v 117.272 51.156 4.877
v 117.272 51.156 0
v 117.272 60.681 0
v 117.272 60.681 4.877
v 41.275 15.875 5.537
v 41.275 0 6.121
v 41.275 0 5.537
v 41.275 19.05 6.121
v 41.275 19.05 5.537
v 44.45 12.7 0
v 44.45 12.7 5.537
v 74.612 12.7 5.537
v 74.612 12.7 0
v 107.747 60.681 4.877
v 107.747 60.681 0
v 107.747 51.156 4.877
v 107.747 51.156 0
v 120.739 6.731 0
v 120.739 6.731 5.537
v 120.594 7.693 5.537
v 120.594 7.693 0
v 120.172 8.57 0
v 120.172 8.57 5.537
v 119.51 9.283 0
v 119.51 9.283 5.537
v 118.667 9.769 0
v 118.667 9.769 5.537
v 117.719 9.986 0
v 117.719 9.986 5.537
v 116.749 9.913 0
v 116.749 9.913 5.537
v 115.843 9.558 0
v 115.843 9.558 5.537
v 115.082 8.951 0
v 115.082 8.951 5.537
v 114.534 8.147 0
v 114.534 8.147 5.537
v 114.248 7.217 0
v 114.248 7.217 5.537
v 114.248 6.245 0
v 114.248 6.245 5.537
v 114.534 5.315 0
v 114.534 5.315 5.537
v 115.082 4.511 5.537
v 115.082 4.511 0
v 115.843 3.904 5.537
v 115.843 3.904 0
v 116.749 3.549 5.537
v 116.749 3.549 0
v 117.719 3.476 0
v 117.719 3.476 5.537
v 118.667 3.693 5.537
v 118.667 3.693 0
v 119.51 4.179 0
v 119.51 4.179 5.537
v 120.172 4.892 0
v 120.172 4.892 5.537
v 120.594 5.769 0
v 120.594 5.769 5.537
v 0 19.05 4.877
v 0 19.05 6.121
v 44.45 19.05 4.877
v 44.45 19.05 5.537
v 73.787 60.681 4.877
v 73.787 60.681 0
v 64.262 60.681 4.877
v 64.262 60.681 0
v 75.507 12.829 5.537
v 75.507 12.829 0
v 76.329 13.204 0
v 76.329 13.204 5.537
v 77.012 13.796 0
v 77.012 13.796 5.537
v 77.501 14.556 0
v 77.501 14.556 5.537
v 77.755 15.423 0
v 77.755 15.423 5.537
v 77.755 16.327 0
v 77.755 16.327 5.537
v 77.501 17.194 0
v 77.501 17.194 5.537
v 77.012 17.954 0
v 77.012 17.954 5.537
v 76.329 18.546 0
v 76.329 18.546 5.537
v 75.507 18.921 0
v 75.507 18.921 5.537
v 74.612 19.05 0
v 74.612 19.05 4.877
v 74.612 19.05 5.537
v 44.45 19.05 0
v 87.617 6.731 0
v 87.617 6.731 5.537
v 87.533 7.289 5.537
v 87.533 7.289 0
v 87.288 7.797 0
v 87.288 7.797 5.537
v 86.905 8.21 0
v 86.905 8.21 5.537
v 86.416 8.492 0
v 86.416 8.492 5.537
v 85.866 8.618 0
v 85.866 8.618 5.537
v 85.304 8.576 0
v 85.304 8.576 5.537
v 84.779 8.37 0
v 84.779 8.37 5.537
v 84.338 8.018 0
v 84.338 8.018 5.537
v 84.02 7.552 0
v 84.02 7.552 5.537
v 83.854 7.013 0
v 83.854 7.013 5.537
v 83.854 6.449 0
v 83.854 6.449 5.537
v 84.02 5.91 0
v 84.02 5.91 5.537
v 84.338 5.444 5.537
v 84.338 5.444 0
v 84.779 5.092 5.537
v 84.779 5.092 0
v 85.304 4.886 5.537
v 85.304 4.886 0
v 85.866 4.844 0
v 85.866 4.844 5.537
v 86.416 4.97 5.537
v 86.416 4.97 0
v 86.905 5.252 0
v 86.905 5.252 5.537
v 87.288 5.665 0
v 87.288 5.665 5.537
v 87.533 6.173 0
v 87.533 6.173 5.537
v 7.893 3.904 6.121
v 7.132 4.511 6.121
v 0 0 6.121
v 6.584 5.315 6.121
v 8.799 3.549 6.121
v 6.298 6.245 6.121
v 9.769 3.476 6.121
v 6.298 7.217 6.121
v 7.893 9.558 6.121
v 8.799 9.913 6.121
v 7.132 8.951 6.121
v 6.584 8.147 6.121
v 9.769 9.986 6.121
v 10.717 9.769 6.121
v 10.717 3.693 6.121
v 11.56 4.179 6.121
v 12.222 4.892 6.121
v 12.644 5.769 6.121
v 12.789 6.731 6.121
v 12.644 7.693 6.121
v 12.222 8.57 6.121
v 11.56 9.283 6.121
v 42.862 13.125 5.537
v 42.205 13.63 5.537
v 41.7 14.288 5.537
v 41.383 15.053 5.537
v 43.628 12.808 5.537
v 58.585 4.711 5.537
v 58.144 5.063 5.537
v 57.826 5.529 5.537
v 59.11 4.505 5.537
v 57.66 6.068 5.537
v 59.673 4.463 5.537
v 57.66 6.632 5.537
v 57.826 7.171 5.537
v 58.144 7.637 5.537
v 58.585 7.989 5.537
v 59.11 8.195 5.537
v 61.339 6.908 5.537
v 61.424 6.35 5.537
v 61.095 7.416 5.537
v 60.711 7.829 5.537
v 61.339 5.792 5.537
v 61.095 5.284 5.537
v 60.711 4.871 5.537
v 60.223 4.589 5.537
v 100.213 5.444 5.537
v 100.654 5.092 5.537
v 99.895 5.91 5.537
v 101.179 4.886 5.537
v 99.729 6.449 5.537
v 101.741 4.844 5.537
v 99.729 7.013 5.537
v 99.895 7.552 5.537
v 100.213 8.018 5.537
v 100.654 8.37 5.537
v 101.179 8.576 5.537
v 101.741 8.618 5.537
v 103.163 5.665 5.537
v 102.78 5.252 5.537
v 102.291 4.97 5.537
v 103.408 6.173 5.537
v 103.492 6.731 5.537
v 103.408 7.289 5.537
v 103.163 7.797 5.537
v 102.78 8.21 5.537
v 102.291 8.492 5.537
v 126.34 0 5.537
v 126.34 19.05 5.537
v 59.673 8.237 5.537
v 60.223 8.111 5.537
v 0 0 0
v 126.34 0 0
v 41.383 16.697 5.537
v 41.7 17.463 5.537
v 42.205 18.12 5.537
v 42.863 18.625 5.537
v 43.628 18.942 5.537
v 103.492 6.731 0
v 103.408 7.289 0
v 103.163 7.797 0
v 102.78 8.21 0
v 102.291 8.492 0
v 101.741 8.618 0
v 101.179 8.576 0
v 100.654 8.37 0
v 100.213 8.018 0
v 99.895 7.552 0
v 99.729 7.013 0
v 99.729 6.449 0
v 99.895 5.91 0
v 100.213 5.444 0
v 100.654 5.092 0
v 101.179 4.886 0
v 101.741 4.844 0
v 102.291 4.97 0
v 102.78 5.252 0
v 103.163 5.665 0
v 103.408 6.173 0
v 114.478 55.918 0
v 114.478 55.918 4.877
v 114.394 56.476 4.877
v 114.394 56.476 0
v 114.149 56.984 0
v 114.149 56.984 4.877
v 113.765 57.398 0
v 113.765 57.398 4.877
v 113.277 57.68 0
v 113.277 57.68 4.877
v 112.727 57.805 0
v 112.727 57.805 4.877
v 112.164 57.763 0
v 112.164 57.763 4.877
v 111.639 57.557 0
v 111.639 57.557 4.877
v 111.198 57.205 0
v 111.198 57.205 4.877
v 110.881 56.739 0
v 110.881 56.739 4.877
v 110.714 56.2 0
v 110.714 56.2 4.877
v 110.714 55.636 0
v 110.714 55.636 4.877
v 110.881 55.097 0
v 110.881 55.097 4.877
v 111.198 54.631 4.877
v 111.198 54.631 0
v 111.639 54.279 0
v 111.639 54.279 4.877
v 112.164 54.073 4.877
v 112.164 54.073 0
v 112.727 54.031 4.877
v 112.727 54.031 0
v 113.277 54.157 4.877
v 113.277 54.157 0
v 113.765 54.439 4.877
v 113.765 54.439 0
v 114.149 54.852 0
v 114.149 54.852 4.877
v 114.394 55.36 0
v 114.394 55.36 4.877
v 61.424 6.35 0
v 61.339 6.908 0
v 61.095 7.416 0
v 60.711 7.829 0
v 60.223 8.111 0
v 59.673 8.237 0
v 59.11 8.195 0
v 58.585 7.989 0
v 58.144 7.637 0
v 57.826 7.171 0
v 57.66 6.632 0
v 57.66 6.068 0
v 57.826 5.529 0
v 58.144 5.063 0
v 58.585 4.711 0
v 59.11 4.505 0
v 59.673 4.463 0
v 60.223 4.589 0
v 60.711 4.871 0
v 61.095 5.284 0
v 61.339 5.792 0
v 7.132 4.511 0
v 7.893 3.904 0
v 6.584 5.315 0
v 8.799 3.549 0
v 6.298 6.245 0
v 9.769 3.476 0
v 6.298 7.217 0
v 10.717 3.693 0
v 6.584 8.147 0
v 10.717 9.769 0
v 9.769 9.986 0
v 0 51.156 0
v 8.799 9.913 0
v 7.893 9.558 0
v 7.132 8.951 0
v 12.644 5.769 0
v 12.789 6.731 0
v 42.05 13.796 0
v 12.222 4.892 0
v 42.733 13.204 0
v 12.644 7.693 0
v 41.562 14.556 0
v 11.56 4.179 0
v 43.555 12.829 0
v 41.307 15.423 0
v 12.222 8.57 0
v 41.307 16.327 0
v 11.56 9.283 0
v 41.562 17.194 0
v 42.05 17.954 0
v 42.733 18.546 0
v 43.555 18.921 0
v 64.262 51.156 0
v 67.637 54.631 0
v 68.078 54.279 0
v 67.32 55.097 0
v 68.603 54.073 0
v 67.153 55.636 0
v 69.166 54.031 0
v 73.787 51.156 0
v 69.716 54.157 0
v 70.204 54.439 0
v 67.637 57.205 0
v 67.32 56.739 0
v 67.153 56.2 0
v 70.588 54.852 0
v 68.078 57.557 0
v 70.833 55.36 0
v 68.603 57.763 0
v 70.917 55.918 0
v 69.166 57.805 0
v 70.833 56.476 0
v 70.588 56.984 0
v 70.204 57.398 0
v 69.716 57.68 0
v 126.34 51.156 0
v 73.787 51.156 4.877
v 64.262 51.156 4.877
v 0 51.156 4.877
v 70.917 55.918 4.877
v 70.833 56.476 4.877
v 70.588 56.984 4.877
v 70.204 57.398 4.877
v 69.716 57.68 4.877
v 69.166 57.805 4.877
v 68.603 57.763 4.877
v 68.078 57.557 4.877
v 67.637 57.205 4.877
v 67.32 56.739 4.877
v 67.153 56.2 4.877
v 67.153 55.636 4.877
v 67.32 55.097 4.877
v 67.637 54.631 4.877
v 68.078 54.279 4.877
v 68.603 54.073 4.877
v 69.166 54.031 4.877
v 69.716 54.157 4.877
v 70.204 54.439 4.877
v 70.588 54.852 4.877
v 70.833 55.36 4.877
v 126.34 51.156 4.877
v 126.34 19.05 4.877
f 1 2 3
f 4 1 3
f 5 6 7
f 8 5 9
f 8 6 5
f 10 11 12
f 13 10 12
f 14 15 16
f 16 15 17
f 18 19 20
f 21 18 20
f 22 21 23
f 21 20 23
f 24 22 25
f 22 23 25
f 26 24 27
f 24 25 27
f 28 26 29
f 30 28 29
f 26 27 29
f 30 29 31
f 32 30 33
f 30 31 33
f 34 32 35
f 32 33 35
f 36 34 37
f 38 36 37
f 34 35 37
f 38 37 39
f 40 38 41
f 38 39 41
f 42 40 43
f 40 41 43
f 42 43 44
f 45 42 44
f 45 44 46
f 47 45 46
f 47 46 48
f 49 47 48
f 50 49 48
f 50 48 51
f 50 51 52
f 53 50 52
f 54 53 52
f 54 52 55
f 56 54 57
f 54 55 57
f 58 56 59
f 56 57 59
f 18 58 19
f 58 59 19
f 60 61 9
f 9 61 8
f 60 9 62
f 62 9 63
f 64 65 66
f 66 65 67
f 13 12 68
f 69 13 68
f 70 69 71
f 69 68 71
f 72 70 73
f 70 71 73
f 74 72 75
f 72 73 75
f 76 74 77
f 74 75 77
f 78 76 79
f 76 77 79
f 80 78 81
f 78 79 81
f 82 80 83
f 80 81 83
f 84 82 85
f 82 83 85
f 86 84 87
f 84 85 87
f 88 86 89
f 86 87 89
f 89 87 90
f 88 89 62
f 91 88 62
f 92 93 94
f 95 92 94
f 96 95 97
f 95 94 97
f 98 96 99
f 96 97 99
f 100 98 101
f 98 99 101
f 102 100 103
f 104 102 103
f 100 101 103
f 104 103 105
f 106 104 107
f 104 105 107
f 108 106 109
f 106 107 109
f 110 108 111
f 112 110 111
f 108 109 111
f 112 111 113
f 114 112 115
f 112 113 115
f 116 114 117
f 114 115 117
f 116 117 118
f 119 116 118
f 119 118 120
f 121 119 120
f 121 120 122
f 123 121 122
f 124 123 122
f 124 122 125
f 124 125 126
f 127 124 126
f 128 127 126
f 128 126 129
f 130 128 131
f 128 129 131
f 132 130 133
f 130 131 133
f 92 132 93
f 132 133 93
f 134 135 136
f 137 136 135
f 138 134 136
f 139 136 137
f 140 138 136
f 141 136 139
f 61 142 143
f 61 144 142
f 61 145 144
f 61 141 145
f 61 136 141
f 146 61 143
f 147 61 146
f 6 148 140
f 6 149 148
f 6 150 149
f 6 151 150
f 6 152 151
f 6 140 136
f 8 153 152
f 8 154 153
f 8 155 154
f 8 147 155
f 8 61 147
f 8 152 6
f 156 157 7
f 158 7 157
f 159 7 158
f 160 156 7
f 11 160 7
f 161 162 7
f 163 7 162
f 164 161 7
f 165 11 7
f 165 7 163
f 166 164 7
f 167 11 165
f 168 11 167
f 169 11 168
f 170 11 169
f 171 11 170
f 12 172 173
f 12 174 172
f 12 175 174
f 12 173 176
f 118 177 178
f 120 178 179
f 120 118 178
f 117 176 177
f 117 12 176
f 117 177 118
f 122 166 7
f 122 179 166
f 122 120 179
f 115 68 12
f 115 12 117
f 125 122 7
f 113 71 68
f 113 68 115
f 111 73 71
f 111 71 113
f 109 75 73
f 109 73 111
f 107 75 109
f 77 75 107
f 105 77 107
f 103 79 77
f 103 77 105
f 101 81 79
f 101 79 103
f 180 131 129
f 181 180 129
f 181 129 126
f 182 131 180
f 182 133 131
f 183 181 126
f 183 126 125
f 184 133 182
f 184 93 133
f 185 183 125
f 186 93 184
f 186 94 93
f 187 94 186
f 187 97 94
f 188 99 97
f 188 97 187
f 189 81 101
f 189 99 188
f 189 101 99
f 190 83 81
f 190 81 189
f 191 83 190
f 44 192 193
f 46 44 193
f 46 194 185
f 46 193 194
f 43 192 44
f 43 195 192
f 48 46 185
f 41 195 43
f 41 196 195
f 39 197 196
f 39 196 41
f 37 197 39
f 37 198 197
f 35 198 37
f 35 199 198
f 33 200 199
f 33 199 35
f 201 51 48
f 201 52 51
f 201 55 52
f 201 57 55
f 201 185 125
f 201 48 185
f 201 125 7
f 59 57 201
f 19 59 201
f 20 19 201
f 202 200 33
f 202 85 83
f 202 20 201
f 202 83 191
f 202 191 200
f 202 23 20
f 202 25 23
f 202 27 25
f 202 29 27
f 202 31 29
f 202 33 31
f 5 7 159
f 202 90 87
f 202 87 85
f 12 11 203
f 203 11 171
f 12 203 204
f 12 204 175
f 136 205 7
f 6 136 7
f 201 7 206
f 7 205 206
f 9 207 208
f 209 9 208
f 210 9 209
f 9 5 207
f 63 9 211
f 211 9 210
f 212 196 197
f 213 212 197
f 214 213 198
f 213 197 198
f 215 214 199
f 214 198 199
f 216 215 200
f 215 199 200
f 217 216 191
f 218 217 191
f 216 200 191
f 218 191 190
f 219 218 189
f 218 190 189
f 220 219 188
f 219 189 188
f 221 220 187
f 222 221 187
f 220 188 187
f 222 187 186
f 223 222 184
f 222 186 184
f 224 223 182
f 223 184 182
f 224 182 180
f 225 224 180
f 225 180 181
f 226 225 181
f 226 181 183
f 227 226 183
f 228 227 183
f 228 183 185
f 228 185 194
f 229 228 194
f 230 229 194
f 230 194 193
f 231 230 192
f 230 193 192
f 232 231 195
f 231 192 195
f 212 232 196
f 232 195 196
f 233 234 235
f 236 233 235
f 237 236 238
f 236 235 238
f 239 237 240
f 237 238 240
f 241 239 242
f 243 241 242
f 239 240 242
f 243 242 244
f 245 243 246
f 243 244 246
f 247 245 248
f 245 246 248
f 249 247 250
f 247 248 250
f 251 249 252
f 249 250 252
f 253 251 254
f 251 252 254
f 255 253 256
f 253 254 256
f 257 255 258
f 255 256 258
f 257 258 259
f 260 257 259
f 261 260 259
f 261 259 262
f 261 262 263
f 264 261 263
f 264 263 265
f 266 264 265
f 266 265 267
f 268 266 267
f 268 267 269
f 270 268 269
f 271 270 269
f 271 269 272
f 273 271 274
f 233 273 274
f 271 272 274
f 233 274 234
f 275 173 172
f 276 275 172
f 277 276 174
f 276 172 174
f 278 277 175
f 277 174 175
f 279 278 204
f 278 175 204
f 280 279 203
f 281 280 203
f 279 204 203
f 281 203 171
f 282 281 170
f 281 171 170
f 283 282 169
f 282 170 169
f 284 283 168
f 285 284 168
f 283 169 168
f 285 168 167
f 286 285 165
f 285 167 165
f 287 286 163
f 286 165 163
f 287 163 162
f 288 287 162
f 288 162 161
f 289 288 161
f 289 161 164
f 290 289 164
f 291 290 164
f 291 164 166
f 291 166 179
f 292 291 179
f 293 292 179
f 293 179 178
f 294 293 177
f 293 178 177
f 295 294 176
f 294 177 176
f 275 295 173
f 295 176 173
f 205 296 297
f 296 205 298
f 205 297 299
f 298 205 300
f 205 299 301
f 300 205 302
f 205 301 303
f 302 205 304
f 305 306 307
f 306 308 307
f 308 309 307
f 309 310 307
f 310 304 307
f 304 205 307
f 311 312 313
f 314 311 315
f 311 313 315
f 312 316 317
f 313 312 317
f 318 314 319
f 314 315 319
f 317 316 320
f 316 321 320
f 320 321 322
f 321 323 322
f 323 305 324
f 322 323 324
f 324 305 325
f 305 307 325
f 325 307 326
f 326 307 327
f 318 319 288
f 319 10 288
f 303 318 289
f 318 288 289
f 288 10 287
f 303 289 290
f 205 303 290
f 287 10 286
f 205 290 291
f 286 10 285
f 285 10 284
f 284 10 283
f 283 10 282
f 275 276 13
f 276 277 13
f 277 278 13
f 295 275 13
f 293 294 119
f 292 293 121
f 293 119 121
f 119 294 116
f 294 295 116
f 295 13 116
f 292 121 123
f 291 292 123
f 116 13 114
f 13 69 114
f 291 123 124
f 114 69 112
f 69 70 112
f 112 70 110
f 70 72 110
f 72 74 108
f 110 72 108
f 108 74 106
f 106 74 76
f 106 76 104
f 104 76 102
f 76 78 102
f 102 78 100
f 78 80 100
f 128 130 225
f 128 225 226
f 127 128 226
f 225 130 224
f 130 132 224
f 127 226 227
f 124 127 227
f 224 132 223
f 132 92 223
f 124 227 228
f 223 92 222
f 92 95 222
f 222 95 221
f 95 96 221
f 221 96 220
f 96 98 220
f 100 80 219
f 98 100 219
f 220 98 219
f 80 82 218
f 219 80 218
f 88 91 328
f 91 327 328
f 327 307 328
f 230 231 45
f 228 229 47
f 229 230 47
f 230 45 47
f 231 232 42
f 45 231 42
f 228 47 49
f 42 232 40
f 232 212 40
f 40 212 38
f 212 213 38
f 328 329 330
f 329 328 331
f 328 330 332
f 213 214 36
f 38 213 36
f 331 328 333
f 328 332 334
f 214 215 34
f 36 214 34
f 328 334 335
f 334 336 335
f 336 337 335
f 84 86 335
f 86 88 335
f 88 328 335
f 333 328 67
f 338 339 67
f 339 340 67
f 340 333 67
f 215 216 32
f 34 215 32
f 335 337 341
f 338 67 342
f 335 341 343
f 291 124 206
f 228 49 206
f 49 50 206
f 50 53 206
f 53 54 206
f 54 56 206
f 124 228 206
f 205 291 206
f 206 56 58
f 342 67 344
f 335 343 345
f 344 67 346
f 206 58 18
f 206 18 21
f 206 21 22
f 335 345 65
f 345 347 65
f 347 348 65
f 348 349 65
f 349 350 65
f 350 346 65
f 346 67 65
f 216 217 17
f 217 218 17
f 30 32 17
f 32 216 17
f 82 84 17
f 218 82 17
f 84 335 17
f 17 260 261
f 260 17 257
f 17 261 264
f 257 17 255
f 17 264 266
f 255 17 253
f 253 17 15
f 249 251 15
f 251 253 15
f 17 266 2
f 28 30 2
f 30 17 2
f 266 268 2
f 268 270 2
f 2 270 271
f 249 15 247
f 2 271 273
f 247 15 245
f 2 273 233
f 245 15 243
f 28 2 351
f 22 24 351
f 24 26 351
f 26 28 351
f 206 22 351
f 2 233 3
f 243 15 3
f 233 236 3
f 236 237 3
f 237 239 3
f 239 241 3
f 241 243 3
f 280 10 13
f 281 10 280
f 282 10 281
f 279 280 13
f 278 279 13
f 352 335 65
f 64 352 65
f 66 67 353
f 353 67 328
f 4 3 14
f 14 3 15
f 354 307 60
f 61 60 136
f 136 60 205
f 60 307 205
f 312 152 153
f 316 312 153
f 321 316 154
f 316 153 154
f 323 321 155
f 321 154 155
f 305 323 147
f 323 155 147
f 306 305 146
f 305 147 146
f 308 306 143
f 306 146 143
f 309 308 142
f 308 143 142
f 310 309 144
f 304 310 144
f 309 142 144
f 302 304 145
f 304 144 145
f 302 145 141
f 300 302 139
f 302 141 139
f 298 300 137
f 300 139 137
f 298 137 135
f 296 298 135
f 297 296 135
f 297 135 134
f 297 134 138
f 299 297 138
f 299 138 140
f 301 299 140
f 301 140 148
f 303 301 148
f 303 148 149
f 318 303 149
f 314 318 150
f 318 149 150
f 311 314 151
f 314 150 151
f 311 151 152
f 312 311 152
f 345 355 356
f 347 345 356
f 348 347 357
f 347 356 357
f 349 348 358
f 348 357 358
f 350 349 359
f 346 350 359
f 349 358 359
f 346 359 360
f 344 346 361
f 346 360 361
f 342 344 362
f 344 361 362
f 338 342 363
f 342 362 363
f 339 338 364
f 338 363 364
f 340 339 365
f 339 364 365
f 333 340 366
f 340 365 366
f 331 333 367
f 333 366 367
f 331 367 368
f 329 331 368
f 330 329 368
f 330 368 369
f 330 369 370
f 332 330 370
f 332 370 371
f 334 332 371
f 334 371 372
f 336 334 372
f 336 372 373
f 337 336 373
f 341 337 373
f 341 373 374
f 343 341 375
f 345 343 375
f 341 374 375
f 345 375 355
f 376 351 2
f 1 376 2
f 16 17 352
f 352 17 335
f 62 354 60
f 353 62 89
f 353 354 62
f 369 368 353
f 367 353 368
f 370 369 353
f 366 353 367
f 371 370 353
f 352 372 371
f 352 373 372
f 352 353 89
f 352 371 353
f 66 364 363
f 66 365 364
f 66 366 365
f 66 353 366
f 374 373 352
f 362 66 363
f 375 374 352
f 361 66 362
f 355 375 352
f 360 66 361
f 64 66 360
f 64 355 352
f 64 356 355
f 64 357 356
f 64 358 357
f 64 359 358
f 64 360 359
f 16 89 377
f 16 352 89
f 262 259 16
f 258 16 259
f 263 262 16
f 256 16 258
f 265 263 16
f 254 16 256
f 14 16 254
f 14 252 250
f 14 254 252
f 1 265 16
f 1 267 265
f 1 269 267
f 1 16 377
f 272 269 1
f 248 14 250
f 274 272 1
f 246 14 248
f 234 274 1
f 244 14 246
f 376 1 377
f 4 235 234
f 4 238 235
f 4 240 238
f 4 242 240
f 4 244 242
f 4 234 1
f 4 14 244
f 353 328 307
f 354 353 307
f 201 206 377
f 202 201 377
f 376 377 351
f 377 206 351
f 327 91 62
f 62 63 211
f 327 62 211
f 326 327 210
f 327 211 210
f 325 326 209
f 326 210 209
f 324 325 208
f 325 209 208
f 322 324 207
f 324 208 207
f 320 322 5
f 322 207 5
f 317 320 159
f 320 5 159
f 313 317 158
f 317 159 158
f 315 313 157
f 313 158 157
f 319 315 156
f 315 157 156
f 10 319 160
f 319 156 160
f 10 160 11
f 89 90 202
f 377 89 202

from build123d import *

# Parameters (mm, degrees)
F1_DEPTH  = 6.1214
F2_W      = 126.3396
F2_H      = 43.2846567154
F3_DEPTH  = 1.2446
F4_W      = 85.1099437237
F4_H      = 19.05
F5_DEPTH  = 0.5842
F7_DEPTH  = 5.5372
F8_R      = 1.8923
F9_DEPTH  = 4.8768
F10_R     = 1.8923
F11_DEPTH = 5.5372
F12_R     = 3.2639
F13_DEPTH = 6.1214
F14_R     = 1.8923
F15_DEPTH = 5.5372
F16_R     = 3.2639
F17_DEPTH = 5.5372


with BuildPart() as f1:
    # F0 (on Top) → F1 (new body)
    with BuildSketch(Plane.XY):
        Polygon((0, 51.1556), (0, 0), (126.3396, 0), (126.3396, 51.1556), (117.2718, 51.1556), (117.2718, 60.6806), (107.7468, 60.6806), (107.7468, 51.1556), (73.787, 51.1556), (73.787, 60.6806), (64.262, 60.6806), (64.262, 51.1556), align=None)
    extrude(amount=F1_DEPTH)

    # F2 (on face) → F3 (cut)
    with BuildSketch(Plane.XY.offset(6.1214)):
        with Locations((63.1698, 40.6923283577)):
            Rectangle(F2_W, F2_H)
    extrude(amount=-F3_DEPTH, mode=Mode.SUBTRACT)

    # F4 (on face) → F5 (cut)
    with BuildSketch(Plane.XY.offset(6.1214)):
        with Locations((83.8299718618, 9.525)):
            Rectangle(F4_W, F4_H)
    extrude(amount=-F5_DEPTH, mode=Mode.SUBTRACT)

    # F6 (on face) → F7 (cut, through all)
    with BuildSketch(Plane.XY.offset(5.5372)):
        with BuildLine():
            Line((74.6125, 19.05), (44.45, 19.05))
            ThreePointArc((44.45, 19.05), (41.275, 15.875), (44.45, 12.7))
            Line((44.45, 12.7), (74.6125, 12.7))
            ThreePointArc((74.6125, 12.7), (77.7875, 15.875), (74.6125, 19.05))
        make_face()
    extrude(amount=-F7_DEPTH, mode=Mode.SUBTRACT)

    # F8 (on face) → F9 (cut, through all)
    with BuildSketch(Plane.XY.offset(4.8768)):
        with Locations((69.0245, 55.9181)):
            Circle(F8_R)
        with Locations((112.5855, 55.9181)):
            Circle(F8_R)
    extrude(amount=-F9_DEPTH, mode=Mode.SUBTRACT)

    # F10 (on face) → F11 (cut, through all)
    with BuildSketch(Plane.XY.offset(5.5372)):
        with Locations((59.53125, 6.35)):
            Circle(F10_R)
    extrude(amount=-F11_DEPTH, mode=Mode.SUBTRACT)

    # F12 (on face) → F13 (cut, through all)
    with BuildSketch(Plane.XY.offset(6.1214)):
        with Locations((9.525, 6.731)):
            Circle(F12_R)
    extrude(amount=-F13_DEPTH, mode=Mode.SUBTRACT)

    # F14 (on face) → F15 (cut, through all)
    with BuildSketch(Plane.XY.offset(5.5372)):
        with Locations((85.725, 6.731)):
            Circle(F14_R)
        with Locations((101.6, 6.731)):
            Circle(F14_R)
    extrude(amount=-F15_DEPTH, mode=Mode.SUBTRACT)

    # F16 (on face) → F17 (cut, through all)
    with BuildSketch(Plane.XY.offset(5.5372)):
        with Locations((117.475, 6.731)):
            Circle(F16_R)
    extrude(amount=-F17_DEPTH, mode=Mode.SUBTRACT)


solid = f1.part
